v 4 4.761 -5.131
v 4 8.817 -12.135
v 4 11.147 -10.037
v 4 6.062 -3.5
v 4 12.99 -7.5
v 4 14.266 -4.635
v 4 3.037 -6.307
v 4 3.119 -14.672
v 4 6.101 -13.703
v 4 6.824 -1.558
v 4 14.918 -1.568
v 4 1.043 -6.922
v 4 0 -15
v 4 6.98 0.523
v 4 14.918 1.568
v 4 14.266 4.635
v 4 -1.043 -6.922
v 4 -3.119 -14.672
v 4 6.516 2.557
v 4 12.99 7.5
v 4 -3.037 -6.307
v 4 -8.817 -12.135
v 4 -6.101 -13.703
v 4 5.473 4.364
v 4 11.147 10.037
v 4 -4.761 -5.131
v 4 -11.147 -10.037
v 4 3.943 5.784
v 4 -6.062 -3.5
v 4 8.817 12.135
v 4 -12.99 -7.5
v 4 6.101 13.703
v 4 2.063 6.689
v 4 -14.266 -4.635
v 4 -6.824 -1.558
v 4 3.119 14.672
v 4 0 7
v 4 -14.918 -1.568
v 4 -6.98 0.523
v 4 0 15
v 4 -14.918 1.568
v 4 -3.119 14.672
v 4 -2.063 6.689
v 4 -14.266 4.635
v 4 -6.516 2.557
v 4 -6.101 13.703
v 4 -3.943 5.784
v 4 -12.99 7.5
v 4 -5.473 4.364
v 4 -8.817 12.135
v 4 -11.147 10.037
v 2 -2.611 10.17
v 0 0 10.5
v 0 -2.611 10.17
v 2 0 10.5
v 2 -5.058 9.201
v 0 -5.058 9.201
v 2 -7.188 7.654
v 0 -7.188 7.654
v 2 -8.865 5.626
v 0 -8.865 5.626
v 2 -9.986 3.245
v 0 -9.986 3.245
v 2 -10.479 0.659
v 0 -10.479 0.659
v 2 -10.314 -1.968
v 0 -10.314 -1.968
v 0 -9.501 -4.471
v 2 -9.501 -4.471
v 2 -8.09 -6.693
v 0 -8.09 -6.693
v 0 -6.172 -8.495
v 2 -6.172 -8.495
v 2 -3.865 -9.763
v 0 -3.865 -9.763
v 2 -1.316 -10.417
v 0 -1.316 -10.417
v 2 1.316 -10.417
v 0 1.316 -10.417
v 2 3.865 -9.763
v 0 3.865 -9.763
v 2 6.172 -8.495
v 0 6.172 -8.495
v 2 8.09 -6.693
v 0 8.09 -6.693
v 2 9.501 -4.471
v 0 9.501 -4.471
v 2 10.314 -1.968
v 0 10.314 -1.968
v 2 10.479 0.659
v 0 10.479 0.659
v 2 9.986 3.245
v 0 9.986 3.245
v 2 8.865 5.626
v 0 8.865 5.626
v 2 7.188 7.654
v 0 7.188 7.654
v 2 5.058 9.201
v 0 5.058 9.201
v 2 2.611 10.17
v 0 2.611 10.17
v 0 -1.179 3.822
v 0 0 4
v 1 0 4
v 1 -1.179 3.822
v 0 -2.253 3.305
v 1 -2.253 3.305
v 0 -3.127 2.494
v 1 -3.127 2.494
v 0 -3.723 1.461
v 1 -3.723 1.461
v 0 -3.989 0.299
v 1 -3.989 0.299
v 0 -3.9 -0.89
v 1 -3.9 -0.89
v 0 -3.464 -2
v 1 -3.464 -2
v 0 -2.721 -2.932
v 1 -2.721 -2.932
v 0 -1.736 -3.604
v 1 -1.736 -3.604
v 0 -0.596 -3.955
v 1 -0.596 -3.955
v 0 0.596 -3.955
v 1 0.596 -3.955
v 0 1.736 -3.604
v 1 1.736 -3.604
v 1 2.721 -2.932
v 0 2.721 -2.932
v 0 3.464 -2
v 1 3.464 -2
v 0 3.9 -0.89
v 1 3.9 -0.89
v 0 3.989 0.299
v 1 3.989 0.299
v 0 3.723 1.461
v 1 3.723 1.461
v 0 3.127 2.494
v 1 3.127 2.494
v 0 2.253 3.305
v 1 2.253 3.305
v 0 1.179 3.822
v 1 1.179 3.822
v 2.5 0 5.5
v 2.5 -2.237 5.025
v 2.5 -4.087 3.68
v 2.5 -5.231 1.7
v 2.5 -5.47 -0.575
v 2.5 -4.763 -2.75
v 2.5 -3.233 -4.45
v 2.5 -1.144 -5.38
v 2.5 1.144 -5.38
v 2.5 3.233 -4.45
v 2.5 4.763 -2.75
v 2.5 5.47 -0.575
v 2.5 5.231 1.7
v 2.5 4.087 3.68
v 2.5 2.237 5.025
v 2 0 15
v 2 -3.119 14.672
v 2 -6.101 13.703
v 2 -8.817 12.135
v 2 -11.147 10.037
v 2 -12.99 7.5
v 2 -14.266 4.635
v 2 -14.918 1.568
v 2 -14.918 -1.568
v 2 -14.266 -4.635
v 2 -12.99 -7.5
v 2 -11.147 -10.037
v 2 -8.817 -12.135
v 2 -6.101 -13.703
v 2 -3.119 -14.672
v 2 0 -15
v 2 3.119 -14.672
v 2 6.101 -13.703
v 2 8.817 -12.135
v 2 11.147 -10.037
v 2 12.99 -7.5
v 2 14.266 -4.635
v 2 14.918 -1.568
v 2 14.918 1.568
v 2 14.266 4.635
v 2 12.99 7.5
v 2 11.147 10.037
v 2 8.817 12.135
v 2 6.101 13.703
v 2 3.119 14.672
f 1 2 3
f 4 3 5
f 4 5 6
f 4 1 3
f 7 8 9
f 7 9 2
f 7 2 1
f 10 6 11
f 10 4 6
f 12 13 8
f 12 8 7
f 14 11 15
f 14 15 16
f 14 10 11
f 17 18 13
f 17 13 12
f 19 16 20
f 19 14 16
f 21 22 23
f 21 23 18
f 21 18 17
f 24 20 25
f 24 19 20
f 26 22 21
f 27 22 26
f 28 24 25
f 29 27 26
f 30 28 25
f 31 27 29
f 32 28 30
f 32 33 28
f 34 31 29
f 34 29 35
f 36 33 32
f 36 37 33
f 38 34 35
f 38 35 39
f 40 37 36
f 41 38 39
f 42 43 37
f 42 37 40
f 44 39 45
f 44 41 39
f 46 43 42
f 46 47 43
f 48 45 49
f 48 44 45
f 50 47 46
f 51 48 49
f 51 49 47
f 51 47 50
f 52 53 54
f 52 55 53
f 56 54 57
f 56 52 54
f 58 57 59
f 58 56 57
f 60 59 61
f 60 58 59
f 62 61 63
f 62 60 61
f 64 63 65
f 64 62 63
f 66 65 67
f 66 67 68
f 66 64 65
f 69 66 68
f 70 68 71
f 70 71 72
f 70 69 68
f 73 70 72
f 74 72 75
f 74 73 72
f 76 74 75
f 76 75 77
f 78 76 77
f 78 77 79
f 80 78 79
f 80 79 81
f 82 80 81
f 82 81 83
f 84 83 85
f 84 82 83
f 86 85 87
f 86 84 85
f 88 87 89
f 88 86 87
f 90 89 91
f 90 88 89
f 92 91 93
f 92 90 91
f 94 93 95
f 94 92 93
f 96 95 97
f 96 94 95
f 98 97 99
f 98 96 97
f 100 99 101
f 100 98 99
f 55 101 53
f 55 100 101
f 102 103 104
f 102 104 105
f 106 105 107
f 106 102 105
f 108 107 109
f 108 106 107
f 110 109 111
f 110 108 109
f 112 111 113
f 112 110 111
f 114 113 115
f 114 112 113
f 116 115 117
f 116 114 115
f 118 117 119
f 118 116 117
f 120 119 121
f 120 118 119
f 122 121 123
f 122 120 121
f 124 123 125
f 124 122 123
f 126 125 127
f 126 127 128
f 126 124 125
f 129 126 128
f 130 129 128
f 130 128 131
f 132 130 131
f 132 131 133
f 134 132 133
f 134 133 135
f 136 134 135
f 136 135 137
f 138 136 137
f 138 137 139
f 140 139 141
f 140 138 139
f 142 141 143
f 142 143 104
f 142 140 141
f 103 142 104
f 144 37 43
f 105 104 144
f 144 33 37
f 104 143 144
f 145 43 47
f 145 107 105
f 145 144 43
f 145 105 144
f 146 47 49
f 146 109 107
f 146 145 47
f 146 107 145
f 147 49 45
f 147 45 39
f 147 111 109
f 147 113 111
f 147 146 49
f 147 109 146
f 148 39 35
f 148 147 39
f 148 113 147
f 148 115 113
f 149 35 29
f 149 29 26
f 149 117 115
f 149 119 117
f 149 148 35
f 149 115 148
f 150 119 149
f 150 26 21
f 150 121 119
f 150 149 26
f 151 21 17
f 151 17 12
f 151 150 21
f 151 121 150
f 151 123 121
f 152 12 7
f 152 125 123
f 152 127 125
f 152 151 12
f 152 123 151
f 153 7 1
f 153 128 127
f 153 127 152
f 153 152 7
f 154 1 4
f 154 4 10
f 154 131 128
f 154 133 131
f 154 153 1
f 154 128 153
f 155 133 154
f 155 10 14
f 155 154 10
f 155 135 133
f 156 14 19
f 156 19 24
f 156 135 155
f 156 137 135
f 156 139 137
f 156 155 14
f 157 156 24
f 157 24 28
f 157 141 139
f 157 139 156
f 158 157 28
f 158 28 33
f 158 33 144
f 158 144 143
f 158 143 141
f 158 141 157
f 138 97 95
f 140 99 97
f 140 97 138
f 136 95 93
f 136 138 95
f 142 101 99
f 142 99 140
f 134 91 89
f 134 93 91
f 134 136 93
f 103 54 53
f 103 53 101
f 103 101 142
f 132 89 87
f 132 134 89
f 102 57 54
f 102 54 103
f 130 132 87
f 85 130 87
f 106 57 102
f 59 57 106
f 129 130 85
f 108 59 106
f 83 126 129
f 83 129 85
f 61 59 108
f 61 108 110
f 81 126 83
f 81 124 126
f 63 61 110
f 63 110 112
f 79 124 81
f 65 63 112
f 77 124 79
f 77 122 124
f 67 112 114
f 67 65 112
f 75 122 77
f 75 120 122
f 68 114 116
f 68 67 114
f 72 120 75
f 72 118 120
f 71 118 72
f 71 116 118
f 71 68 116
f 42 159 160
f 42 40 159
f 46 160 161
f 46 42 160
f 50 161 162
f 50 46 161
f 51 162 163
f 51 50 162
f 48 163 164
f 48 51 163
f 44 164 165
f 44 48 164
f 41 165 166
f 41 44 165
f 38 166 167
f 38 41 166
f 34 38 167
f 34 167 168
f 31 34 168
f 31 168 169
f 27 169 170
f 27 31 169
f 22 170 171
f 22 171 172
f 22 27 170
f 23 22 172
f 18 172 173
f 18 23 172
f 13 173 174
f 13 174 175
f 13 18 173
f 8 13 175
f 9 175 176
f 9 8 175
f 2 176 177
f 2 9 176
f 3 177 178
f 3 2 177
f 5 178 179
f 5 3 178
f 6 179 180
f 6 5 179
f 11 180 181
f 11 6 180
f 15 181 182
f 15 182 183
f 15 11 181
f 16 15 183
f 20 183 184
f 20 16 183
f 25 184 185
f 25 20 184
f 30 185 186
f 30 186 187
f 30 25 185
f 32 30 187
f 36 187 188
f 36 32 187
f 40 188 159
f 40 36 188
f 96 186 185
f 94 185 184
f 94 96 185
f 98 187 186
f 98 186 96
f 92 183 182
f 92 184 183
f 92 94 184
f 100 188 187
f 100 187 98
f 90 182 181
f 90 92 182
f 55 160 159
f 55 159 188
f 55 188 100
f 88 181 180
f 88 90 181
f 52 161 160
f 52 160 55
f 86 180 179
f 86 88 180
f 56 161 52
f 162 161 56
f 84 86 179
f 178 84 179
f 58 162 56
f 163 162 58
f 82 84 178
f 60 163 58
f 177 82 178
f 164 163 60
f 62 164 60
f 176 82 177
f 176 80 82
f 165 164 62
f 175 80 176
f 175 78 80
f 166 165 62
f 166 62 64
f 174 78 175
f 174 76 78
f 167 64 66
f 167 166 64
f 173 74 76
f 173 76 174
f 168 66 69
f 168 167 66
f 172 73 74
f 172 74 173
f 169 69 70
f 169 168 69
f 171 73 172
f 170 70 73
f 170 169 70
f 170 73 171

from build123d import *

# Parameters (mm, degrees)
CHAMFER_SIZE = 3


with BuildPart() as part:
    # Sketch → Revolution (revolve)
    with BuildSketch(Plane.XZ):
        Polygon((0, 4), (0, 10.5), (2, 10.5), (2, 15), (4, 15), (4, 4), align=None)
    revolve(axis=Axis((0, 0, 0), (1, 0, 0)))

    # Chamfer
    chamfer_edges = [part.edges().sort_by_distance(p)[0] for p in [
        (4, 0, -4),
    ]]
    chamfer(chamfer_edges, length=CHAMFER_SIZE)


solid = part.part
